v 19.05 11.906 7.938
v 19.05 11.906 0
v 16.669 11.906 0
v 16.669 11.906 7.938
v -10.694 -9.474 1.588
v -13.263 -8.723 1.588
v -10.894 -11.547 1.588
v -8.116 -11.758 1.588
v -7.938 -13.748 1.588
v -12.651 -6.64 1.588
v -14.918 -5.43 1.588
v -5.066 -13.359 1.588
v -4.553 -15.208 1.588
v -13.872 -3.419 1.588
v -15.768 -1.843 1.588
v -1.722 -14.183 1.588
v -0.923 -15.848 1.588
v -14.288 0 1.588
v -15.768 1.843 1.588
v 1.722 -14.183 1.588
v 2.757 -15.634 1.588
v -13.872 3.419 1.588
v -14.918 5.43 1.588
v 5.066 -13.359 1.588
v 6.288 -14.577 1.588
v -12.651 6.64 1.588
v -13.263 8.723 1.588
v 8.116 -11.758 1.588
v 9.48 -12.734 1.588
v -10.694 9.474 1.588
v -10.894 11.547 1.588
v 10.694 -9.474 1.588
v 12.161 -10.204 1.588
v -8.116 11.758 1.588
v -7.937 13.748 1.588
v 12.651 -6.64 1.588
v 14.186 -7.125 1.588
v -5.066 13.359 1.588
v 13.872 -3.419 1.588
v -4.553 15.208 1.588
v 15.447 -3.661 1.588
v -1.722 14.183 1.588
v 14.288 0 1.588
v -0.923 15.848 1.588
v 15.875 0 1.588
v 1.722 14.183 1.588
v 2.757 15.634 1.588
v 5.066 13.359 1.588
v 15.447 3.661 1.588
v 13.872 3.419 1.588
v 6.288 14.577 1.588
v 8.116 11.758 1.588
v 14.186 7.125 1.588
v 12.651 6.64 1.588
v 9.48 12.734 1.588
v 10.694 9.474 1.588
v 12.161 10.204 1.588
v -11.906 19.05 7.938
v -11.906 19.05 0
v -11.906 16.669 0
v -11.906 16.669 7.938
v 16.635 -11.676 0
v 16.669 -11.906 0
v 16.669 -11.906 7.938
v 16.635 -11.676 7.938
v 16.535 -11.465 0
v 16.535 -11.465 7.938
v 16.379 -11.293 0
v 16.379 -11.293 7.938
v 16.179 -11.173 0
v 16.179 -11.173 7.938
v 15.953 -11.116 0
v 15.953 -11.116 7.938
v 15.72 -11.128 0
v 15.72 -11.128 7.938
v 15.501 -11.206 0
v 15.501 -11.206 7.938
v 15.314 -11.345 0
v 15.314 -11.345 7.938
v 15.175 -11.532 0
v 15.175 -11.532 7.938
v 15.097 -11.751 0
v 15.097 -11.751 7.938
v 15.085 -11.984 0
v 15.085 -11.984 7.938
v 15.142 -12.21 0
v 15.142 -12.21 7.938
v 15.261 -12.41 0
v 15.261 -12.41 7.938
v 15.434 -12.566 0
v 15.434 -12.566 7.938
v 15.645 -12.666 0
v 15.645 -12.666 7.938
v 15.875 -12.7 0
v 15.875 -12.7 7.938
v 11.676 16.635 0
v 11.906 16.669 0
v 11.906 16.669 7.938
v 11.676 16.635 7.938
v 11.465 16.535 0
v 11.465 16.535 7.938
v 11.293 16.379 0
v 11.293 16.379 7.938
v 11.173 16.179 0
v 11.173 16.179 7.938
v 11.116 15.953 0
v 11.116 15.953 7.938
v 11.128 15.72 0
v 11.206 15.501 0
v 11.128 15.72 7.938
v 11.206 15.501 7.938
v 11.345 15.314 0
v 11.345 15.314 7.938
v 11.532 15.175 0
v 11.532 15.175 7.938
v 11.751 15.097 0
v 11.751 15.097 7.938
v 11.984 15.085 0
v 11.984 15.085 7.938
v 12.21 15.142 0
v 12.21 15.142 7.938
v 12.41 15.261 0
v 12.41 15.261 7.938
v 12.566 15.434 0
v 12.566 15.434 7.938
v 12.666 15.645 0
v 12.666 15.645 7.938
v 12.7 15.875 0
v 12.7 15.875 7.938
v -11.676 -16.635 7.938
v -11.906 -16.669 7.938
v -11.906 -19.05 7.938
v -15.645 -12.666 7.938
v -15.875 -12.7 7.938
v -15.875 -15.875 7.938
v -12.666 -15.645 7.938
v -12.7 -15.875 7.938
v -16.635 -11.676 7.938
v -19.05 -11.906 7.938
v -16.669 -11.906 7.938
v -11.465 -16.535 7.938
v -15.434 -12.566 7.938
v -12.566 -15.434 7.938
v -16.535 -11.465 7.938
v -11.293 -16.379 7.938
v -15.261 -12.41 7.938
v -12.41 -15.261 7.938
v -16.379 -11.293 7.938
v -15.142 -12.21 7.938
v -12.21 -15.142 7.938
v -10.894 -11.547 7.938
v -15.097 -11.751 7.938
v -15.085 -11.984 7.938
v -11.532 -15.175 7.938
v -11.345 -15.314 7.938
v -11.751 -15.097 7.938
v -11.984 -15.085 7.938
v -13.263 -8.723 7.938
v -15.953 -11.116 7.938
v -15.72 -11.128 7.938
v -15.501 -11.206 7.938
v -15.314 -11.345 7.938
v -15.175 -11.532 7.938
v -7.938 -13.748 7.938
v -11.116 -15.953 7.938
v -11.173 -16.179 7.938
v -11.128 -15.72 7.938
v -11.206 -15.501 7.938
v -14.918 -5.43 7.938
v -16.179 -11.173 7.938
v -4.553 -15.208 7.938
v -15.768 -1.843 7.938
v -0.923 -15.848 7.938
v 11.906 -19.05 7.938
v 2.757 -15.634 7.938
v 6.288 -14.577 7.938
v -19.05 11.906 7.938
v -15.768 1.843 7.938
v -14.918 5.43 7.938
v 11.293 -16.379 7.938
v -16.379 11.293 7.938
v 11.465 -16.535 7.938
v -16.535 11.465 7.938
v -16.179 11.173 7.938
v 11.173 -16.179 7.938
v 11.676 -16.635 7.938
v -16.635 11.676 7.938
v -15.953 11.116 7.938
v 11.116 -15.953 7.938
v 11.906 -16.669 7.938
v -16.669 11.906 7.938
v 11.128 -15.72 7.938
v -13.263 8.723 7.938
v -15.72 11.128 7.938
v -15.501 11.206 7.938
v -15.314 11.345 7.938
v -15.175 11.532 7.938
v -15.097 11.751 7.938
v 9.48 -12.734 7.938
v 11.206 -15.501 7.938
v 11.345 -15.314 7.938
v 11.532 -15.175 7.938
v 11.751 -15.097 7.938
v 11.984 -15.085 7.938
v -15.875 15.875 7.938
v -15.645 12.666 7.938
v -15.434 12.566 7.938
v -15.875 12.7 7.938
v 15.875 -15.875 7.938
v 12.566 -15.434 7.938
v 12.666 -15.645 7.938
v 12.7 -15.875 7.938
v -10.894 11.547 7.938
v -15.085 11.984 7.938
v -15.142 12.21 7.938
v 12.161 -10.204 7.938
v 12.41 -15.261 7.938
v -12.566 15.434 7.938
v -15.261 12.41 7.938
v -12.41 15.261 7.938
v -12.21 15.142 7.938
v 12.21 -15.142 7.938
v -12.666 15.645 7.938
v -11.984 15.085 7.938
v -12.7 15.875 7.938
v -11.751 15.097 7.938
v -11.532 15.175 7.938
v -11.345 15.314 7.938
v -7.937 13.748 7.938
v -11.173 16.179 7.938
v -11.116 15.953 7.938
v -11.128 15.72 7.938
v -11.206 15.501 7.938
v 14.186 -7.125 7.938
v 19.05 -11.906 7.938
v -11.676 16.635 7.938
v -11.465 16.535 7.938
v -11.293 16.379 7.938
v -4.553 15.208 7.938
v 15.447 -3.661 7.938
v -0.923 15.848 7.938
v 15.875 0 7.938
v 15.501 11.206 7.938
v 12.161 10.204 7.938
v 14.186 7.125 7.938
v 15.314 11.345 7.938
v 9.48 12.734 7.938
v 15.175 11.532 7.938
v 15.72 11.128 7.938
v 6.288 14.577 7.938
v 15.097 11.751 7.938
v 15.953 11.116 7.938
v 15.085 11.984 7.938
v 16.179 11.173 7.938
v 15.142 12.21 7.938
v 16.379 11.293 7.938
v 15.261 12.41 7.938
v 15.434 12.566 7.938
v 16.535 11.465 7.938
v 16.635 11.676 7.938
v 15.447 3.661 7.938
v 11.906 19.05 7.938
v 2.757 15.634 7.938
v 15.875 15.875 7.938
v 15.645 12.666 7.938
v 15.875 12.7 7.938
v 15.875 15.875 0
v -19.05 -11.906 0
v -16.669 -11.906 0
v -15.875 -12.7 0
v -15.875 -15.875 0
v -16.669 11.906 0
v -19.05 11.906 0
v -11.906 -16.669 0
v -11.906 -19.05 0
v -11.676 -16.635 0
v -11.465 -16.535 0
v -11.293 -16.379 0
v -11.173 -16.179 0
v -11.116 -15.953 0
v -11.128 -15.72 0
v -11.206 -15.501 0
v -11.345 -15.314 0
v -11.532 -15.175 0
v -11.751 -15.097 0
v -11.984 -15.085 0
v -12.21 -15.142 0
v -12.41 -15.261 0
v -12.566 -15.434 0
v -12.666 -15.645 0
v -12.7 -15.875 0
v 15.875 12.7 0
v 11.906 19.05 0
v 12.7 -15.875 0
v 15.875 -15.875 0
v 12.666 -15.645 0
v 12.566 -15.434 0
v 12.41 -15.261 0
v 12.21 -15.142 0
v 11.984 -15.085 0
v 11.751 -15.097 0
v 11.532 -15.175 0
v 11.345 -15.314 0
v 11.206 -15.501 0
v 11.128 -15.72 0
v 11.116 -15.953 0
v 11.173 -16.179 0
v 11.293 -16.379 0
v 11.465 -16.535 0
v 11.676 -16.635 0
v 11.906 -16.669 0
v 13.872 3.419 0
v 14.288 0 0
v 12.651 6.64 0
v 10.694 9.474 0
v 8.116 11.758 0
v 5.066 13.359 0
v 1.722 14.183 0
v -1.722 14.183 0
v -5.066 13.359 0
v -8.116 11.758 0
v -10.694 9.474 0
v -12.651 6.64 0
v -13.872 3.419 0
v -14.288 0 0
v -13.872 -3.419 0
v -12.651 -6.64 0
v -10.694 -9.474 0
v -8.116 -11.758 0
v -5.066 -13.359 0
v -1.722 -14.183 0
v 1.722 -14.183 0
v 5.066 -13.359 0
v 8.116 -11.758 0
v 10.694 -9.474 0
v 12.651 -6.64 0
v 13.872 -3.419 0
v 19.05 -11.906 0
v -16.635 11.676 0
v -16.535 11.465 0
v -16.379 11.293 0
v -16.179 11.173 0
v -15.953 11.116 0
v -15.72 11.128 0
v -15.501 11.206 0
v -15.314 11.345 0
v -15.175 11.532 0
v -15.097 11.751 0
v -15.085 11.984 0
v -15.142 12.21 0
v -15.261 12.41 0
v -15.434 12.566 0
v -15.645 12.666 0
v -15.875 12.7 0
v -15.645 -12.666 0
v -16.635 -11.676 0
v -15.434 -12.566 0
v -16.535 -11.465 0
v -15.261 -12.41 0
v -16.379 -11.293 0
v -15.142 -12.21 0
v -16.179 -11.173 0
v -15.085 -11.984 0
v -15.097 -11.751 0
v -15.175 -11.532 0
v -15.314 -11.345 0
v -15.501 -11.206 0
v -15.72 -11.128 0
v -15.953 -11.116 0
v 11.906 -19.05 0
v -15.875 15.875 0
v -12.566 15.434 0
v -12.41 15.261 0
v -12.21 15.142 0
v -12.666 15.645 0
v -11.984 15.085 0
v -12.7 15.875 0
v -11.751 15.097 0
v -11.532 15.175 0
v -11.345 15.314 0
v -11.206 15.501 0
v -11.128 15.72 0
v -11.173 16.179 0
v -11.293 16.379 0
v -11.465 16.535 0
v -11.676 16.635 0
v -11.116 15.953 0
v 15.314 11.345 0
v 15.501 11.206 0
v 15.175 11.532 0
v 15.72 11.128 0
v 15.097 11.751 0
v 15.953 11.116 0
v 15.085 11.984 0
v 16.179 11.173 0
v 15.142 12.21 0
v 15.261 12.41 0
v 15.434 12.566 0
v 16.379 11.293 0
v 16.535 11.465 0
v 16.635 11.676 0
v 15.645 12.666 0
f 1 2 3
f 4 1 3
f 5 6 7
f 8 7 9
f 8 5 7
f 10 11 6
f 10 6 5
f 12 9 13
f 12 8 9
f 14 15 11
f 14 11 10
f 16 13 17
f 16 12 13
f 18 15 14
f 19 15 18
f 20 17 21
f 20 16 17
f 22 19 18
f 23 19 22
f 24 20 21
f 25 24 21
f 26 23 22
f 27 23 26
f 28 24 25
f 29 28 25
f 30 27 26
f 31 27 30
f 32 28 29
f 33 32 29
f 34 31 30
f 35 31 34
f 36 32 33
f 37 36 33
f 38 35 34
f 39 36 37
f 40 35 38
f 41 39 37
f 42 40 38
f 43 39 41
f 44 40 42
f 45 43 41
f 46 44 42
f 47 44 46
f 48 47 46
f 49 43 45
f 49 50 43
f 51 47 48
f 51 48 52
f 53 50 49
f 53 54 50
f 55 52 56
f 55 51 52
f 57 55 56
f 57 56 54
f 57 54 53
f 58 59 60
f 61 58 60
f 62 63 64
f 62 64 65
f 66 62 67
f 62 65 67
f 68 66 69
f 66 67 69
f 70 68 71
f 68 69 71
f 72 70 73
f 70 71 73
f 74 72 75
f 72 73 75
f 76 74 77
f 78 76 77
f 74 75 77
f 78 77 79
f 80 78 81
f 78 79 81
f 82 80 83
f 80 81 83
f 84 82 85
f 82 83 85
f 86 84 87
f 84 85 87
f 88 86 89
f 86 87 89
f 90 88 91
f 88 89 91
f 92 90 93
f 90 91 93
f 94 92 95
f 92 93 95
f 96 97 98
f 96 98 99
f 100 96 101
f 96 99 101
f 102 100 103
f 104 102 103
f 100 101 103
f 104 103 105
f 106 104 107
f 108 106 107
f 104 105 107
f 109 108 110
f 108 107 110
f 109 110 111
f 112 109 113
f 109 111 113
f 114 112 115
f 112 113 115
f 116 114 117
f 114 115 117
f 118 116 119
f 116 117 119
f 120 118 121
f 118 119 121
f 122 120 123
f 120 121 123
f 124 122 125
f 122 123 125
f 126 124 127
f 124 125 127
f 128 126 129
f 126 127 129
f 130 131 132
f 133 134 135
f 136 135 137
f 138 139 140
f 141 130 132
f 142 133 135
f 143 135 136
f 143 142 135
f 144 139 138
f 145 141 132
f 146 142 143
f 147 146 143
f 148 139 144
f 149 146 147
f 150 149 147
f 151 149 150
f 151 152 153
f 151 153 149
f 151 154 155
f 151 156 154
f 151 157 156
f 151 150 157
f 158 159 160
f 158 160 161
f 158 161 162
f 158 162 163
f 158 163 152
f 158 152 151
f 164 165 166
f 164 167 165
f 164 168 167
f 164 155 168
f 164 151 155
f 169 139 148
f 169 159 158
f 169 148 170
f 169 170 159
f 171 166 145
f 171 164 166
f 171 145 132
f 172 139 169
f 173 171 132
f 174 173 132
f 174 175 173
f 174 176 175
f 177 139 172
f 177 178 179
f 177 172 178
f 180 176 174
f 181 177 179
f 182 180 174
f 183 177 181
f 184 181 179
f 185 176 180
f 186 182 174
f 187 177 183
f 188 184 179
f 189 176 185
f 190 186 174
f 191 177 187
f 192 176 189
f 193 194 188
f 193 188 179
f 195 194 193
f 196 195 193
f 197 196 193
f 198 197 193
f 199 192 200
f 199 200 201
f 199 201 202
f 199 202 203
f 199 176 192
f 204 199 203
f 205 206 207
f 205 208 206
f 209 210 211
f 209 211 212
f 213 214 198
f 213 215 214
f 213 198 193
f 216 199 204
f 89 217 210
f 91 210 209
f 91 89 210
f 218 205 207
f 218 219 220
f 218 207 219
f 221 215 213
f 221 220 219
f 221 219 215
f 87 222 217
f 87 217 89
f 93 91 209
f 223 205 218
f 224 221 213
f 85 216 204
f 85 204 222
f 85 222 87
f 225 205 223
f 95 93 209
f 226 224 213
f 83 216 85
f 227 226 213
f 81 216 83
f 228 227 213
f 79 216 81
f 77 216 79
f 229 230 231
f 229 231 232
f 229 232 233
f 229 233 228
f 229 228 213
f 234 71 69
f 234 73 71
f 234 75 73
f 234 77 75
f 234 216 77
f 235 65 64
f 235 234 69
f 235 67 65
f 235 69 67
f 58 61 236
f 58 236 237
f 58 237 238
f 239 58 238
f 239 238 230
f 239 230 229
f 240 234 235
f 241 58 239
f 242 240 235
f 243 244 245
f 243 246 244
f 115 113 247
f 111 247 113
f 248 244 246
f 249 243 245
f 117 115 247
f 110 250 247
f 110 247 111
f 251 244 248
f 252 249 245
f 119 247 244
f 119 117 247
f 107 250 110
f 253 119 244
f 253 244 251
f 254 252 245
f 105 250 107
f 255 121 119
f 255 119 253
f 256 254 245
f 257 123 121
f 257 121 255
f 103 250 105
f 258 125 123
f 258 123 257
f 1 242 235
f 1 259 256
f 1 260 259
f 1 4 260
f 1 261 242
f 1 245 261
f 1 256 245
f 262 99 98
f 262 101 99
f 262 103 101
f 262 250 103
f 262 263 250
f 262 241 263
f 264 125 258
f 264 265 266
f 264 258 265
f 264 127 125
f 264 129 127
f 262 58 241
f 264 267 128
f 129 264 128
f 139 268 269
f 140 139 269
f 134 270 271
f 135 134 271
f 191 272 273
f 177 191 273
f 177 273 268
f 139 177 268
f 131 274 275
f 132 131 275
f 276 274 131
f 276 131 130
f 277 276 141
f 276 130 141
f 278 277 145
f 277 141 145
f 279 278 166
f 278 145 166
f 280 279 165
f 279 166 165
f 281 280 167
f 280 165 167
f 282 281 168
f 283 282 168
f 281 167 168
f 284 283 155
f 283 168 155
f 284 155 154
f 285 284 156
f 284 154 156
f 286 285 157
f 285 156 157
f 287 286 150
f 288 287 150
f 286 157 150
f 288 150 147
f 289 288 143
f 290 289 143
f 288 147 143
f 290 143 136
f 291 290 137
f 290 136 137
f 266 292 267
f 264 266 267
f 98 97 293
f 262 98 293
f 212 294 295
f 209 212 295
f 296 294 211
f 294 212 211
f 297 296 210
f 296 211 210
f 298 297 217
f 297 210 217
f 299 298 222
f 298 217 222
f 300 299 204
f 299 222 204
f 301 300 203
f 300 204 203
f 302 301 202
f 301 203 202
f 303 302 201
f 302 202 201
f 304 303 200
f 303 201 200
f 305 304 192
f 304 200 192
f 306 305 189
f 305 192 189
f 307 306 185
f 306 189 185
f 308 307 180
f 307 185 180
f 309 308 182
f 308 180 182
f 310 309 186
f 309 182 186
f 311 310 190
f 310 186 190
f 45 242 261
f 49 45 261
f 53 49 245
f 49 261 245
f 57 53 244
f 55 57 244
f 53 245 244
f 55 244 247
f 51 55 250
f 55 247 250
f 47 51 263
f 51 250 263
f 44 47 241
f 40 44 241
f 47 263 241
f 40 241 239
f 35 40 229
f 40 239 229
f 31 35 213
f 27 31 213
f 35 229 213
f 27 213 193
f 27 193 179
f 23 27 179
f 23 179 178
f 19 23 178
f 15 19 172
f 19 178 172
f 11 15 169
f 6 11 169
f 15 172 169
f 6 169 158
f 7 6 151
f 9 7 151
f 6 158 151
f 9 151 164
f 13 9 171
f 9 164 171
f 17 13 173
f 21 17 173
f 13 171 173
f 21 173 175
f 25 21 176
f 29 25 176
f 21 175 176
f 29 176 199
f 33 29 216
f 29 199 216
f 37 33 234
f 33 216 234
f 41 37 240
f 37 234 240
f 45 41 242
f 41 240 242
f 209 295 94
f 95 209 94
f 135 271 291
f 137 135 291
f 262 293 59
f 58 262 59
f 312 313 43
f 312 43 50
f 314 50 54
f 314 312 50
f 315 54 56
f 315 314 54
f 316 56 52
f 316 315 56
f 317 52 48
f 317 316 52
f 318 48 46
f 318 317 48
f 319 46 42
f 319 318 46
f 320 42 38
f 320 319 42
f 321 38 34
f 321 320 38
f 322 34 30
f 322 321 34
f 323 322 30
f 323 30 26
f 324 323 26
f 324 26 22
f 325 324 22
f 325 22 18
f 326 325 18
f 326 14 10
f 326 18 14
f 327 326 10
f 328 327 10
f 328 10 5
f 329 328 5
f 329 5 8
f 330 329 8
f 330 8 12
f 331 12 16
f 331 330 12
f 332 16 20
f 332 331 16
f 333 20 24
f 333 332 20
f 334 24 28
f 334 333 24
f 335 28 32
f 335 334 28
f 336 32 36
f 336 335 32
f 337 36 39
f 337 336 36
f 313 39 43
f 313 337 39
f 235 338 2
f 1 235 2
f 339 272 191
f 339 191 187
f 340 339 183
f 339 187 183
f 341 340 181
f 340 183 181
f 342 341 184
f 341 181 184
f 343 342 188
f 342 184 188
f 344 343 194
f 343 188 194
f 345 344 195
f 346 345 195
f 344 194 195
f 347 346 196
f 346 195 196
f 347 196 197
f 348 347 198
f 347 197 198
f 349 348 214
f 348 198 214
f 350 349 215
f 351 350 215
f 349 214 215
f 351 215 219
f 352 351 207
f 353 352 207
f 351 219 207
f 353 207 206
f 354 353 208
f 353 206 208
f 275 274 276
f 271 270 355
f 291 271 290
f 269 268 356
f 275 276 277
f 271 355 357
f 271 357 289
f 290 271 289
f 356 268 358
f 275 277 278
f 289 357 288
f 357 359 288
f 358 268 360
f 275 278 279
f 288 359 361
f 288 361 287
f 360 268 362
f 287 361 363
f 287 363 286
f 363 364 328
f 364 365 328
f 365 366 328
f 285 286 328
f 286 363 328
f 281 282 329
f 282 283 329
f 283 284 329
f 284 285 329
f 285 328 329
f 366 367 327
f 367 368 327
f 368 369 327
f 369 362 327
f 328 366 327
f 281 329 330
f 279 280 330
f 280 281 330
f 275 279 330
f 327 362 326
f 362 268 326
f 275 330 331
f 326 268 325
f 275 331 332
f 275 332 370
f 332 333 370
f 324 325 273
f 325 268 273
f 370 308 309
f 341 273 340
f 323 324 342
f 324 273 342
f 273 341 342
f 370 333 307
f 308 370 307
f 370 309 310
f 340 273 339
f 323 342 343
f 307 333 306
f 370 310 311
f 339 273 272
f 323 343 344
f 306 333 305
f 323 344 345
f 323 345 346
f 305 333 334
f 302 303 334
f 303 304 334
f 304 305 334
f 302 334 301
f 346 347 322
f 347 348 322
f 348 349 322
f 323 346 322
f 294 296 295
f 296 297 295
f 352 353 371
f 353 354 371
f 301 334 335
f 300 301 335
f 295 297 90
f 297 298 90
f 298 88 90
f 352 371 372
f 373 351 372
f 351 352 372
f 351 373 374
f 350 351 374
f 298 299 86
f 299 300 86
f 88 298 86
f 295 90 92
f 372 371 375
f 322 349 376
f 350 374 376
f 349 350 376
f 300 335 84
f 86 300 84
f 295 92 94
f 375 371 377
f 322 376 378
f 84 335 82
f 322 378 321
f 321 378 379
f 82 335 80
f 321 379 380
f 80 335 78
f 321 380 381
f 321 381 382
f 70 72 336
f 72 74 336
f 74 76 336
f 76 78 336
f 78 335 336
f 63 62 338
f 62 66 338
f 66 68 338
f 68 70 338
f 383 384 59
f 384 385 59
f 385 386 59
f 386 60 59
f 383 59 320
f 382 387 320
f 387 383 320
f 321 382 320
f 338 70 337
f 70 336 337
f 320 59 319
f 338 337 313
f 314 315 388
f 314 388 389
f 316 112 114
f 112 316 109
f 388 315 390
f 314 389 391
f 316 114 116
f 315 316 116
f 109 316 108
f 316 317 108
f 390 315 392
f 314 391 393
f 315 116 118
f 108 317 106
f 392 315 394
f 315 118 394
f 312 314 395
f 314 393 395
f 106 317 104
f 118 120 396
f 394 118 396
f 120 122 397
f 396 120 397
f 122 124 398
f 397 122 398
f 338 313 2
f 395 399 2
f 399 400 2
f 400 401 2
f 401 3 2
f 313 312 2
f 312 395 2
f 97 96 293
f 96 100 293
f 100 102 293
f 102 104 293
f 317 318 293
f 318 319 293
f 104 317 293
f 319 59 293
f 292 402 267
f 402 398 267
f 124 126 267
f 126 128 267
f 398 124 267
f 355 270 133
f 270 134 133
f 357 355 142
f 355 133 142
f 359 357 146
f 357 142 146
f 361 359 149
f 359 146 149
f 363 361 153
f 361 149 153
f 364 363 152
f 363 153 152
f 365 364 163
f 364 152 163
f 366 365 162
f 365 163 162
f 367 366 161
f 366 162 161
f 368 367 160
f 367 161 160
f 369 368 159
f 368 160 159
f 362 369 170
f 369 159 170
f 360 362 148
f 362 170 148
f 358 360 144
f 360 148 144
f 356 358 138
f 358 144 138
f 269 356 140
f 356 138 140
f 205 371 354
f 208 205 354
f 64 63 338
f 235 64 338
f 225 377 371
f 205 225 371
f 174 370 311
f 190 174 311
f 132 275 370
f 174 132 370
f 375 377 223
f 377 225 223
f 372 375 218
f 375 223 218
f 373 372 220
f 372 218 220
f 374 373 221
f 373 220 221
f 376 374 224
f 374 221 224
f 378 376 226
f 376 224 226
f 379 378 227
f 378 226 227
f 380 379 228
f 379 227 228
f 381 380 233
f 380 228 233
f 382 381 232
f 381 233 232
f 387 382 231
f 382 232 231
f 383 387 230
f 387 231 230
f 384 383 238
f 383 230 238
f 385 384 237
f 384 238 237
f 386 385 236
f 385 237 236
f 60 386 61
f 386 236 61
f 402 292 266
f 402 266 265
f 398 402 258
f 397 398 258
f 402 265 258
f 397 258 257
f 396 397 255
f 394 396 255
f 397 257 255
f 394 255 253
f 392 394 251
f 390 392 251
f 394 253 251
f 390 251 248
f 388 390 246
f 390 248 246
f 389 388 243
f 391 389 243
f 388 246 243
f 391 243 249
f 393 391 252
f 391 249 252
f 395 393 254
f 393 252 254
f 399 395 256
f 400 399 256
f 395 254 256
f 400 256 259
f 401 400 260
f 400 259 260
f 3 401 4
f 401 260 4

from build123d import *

# Parameters (mm, degrees)
F0_R            = 14.2875
F1_DEPTH        = 7.9375
F2_R            = 15.875
F3_DEPTH        = 6.35
F4_R            = 0.79375
F5_DEPTH        = 7.9375
F5_COPIES_COUNT = 4


# Not quite as in the source:
# - a pattern or mirror of a feature is missing from the dataset's text; its kind, count and spacing are read off the source's solid


with BuildPart() as f1:
    # F0 (on Top) → F1 (new body)
    with BuildSketch(Plane.XY):
        Polygon((19.05, 11.90625), (15.875, 11.90625), (15.875, 15.875), (11.90625, 15.875), (11.90625, 19.05), (-11.90625, 19.05), (-11.90625, 15.875), (-15.875, 15.875), (-15.875, 11.90625), (-19.05, 11.90625), (-19.05, -11.90625), (-15.875, -11.90625), (-15.875, -15.875), (-11.90625, -15.875), (-11.90625, -19.05), (11.90625, -19.05), (11.90625, -15.875), (15.875, -15.875), (15.875, -11.90625), (19.05, -11.90625), align=None)
        Circle(F0_R, mode=Mode.SUBTRACT)
    extrude(amount=F1_DEPTH)

    # F2 (on face) → F3 (cut)
    with BuildSketch(Plane.XY.offset(7.9375)):
        Circle(F2_R)
    extrude(amount=-F3_DEPTH, mode=Mode.SUBTRACT)

    # F4 (on face) → F5 (cut, through all)
    with BuildSketch(Plane.XY.offset(7.9375)):
        with Locations((11.90625, 15.875)):
            Circle(F4_R)
        with Locations((-11.90625, 15.875)):
            Circle(F4_R)
    f5 = extrude(amount=-F5_DEPTH, mode=Mode.SUBTRACT)

    # F5_copies: F5 ×4 about axis
    f5_copies_axis = Axis((0, 0, 0), (0, 0, 1))
    for i in range(1, F5_COPIES_COUNT):
        add(f5.rotate(f5_copies_axis, i * 360 / F5_COPIES_COUNT), mode=Mode.SUBTRACT)


solid = f1.part
